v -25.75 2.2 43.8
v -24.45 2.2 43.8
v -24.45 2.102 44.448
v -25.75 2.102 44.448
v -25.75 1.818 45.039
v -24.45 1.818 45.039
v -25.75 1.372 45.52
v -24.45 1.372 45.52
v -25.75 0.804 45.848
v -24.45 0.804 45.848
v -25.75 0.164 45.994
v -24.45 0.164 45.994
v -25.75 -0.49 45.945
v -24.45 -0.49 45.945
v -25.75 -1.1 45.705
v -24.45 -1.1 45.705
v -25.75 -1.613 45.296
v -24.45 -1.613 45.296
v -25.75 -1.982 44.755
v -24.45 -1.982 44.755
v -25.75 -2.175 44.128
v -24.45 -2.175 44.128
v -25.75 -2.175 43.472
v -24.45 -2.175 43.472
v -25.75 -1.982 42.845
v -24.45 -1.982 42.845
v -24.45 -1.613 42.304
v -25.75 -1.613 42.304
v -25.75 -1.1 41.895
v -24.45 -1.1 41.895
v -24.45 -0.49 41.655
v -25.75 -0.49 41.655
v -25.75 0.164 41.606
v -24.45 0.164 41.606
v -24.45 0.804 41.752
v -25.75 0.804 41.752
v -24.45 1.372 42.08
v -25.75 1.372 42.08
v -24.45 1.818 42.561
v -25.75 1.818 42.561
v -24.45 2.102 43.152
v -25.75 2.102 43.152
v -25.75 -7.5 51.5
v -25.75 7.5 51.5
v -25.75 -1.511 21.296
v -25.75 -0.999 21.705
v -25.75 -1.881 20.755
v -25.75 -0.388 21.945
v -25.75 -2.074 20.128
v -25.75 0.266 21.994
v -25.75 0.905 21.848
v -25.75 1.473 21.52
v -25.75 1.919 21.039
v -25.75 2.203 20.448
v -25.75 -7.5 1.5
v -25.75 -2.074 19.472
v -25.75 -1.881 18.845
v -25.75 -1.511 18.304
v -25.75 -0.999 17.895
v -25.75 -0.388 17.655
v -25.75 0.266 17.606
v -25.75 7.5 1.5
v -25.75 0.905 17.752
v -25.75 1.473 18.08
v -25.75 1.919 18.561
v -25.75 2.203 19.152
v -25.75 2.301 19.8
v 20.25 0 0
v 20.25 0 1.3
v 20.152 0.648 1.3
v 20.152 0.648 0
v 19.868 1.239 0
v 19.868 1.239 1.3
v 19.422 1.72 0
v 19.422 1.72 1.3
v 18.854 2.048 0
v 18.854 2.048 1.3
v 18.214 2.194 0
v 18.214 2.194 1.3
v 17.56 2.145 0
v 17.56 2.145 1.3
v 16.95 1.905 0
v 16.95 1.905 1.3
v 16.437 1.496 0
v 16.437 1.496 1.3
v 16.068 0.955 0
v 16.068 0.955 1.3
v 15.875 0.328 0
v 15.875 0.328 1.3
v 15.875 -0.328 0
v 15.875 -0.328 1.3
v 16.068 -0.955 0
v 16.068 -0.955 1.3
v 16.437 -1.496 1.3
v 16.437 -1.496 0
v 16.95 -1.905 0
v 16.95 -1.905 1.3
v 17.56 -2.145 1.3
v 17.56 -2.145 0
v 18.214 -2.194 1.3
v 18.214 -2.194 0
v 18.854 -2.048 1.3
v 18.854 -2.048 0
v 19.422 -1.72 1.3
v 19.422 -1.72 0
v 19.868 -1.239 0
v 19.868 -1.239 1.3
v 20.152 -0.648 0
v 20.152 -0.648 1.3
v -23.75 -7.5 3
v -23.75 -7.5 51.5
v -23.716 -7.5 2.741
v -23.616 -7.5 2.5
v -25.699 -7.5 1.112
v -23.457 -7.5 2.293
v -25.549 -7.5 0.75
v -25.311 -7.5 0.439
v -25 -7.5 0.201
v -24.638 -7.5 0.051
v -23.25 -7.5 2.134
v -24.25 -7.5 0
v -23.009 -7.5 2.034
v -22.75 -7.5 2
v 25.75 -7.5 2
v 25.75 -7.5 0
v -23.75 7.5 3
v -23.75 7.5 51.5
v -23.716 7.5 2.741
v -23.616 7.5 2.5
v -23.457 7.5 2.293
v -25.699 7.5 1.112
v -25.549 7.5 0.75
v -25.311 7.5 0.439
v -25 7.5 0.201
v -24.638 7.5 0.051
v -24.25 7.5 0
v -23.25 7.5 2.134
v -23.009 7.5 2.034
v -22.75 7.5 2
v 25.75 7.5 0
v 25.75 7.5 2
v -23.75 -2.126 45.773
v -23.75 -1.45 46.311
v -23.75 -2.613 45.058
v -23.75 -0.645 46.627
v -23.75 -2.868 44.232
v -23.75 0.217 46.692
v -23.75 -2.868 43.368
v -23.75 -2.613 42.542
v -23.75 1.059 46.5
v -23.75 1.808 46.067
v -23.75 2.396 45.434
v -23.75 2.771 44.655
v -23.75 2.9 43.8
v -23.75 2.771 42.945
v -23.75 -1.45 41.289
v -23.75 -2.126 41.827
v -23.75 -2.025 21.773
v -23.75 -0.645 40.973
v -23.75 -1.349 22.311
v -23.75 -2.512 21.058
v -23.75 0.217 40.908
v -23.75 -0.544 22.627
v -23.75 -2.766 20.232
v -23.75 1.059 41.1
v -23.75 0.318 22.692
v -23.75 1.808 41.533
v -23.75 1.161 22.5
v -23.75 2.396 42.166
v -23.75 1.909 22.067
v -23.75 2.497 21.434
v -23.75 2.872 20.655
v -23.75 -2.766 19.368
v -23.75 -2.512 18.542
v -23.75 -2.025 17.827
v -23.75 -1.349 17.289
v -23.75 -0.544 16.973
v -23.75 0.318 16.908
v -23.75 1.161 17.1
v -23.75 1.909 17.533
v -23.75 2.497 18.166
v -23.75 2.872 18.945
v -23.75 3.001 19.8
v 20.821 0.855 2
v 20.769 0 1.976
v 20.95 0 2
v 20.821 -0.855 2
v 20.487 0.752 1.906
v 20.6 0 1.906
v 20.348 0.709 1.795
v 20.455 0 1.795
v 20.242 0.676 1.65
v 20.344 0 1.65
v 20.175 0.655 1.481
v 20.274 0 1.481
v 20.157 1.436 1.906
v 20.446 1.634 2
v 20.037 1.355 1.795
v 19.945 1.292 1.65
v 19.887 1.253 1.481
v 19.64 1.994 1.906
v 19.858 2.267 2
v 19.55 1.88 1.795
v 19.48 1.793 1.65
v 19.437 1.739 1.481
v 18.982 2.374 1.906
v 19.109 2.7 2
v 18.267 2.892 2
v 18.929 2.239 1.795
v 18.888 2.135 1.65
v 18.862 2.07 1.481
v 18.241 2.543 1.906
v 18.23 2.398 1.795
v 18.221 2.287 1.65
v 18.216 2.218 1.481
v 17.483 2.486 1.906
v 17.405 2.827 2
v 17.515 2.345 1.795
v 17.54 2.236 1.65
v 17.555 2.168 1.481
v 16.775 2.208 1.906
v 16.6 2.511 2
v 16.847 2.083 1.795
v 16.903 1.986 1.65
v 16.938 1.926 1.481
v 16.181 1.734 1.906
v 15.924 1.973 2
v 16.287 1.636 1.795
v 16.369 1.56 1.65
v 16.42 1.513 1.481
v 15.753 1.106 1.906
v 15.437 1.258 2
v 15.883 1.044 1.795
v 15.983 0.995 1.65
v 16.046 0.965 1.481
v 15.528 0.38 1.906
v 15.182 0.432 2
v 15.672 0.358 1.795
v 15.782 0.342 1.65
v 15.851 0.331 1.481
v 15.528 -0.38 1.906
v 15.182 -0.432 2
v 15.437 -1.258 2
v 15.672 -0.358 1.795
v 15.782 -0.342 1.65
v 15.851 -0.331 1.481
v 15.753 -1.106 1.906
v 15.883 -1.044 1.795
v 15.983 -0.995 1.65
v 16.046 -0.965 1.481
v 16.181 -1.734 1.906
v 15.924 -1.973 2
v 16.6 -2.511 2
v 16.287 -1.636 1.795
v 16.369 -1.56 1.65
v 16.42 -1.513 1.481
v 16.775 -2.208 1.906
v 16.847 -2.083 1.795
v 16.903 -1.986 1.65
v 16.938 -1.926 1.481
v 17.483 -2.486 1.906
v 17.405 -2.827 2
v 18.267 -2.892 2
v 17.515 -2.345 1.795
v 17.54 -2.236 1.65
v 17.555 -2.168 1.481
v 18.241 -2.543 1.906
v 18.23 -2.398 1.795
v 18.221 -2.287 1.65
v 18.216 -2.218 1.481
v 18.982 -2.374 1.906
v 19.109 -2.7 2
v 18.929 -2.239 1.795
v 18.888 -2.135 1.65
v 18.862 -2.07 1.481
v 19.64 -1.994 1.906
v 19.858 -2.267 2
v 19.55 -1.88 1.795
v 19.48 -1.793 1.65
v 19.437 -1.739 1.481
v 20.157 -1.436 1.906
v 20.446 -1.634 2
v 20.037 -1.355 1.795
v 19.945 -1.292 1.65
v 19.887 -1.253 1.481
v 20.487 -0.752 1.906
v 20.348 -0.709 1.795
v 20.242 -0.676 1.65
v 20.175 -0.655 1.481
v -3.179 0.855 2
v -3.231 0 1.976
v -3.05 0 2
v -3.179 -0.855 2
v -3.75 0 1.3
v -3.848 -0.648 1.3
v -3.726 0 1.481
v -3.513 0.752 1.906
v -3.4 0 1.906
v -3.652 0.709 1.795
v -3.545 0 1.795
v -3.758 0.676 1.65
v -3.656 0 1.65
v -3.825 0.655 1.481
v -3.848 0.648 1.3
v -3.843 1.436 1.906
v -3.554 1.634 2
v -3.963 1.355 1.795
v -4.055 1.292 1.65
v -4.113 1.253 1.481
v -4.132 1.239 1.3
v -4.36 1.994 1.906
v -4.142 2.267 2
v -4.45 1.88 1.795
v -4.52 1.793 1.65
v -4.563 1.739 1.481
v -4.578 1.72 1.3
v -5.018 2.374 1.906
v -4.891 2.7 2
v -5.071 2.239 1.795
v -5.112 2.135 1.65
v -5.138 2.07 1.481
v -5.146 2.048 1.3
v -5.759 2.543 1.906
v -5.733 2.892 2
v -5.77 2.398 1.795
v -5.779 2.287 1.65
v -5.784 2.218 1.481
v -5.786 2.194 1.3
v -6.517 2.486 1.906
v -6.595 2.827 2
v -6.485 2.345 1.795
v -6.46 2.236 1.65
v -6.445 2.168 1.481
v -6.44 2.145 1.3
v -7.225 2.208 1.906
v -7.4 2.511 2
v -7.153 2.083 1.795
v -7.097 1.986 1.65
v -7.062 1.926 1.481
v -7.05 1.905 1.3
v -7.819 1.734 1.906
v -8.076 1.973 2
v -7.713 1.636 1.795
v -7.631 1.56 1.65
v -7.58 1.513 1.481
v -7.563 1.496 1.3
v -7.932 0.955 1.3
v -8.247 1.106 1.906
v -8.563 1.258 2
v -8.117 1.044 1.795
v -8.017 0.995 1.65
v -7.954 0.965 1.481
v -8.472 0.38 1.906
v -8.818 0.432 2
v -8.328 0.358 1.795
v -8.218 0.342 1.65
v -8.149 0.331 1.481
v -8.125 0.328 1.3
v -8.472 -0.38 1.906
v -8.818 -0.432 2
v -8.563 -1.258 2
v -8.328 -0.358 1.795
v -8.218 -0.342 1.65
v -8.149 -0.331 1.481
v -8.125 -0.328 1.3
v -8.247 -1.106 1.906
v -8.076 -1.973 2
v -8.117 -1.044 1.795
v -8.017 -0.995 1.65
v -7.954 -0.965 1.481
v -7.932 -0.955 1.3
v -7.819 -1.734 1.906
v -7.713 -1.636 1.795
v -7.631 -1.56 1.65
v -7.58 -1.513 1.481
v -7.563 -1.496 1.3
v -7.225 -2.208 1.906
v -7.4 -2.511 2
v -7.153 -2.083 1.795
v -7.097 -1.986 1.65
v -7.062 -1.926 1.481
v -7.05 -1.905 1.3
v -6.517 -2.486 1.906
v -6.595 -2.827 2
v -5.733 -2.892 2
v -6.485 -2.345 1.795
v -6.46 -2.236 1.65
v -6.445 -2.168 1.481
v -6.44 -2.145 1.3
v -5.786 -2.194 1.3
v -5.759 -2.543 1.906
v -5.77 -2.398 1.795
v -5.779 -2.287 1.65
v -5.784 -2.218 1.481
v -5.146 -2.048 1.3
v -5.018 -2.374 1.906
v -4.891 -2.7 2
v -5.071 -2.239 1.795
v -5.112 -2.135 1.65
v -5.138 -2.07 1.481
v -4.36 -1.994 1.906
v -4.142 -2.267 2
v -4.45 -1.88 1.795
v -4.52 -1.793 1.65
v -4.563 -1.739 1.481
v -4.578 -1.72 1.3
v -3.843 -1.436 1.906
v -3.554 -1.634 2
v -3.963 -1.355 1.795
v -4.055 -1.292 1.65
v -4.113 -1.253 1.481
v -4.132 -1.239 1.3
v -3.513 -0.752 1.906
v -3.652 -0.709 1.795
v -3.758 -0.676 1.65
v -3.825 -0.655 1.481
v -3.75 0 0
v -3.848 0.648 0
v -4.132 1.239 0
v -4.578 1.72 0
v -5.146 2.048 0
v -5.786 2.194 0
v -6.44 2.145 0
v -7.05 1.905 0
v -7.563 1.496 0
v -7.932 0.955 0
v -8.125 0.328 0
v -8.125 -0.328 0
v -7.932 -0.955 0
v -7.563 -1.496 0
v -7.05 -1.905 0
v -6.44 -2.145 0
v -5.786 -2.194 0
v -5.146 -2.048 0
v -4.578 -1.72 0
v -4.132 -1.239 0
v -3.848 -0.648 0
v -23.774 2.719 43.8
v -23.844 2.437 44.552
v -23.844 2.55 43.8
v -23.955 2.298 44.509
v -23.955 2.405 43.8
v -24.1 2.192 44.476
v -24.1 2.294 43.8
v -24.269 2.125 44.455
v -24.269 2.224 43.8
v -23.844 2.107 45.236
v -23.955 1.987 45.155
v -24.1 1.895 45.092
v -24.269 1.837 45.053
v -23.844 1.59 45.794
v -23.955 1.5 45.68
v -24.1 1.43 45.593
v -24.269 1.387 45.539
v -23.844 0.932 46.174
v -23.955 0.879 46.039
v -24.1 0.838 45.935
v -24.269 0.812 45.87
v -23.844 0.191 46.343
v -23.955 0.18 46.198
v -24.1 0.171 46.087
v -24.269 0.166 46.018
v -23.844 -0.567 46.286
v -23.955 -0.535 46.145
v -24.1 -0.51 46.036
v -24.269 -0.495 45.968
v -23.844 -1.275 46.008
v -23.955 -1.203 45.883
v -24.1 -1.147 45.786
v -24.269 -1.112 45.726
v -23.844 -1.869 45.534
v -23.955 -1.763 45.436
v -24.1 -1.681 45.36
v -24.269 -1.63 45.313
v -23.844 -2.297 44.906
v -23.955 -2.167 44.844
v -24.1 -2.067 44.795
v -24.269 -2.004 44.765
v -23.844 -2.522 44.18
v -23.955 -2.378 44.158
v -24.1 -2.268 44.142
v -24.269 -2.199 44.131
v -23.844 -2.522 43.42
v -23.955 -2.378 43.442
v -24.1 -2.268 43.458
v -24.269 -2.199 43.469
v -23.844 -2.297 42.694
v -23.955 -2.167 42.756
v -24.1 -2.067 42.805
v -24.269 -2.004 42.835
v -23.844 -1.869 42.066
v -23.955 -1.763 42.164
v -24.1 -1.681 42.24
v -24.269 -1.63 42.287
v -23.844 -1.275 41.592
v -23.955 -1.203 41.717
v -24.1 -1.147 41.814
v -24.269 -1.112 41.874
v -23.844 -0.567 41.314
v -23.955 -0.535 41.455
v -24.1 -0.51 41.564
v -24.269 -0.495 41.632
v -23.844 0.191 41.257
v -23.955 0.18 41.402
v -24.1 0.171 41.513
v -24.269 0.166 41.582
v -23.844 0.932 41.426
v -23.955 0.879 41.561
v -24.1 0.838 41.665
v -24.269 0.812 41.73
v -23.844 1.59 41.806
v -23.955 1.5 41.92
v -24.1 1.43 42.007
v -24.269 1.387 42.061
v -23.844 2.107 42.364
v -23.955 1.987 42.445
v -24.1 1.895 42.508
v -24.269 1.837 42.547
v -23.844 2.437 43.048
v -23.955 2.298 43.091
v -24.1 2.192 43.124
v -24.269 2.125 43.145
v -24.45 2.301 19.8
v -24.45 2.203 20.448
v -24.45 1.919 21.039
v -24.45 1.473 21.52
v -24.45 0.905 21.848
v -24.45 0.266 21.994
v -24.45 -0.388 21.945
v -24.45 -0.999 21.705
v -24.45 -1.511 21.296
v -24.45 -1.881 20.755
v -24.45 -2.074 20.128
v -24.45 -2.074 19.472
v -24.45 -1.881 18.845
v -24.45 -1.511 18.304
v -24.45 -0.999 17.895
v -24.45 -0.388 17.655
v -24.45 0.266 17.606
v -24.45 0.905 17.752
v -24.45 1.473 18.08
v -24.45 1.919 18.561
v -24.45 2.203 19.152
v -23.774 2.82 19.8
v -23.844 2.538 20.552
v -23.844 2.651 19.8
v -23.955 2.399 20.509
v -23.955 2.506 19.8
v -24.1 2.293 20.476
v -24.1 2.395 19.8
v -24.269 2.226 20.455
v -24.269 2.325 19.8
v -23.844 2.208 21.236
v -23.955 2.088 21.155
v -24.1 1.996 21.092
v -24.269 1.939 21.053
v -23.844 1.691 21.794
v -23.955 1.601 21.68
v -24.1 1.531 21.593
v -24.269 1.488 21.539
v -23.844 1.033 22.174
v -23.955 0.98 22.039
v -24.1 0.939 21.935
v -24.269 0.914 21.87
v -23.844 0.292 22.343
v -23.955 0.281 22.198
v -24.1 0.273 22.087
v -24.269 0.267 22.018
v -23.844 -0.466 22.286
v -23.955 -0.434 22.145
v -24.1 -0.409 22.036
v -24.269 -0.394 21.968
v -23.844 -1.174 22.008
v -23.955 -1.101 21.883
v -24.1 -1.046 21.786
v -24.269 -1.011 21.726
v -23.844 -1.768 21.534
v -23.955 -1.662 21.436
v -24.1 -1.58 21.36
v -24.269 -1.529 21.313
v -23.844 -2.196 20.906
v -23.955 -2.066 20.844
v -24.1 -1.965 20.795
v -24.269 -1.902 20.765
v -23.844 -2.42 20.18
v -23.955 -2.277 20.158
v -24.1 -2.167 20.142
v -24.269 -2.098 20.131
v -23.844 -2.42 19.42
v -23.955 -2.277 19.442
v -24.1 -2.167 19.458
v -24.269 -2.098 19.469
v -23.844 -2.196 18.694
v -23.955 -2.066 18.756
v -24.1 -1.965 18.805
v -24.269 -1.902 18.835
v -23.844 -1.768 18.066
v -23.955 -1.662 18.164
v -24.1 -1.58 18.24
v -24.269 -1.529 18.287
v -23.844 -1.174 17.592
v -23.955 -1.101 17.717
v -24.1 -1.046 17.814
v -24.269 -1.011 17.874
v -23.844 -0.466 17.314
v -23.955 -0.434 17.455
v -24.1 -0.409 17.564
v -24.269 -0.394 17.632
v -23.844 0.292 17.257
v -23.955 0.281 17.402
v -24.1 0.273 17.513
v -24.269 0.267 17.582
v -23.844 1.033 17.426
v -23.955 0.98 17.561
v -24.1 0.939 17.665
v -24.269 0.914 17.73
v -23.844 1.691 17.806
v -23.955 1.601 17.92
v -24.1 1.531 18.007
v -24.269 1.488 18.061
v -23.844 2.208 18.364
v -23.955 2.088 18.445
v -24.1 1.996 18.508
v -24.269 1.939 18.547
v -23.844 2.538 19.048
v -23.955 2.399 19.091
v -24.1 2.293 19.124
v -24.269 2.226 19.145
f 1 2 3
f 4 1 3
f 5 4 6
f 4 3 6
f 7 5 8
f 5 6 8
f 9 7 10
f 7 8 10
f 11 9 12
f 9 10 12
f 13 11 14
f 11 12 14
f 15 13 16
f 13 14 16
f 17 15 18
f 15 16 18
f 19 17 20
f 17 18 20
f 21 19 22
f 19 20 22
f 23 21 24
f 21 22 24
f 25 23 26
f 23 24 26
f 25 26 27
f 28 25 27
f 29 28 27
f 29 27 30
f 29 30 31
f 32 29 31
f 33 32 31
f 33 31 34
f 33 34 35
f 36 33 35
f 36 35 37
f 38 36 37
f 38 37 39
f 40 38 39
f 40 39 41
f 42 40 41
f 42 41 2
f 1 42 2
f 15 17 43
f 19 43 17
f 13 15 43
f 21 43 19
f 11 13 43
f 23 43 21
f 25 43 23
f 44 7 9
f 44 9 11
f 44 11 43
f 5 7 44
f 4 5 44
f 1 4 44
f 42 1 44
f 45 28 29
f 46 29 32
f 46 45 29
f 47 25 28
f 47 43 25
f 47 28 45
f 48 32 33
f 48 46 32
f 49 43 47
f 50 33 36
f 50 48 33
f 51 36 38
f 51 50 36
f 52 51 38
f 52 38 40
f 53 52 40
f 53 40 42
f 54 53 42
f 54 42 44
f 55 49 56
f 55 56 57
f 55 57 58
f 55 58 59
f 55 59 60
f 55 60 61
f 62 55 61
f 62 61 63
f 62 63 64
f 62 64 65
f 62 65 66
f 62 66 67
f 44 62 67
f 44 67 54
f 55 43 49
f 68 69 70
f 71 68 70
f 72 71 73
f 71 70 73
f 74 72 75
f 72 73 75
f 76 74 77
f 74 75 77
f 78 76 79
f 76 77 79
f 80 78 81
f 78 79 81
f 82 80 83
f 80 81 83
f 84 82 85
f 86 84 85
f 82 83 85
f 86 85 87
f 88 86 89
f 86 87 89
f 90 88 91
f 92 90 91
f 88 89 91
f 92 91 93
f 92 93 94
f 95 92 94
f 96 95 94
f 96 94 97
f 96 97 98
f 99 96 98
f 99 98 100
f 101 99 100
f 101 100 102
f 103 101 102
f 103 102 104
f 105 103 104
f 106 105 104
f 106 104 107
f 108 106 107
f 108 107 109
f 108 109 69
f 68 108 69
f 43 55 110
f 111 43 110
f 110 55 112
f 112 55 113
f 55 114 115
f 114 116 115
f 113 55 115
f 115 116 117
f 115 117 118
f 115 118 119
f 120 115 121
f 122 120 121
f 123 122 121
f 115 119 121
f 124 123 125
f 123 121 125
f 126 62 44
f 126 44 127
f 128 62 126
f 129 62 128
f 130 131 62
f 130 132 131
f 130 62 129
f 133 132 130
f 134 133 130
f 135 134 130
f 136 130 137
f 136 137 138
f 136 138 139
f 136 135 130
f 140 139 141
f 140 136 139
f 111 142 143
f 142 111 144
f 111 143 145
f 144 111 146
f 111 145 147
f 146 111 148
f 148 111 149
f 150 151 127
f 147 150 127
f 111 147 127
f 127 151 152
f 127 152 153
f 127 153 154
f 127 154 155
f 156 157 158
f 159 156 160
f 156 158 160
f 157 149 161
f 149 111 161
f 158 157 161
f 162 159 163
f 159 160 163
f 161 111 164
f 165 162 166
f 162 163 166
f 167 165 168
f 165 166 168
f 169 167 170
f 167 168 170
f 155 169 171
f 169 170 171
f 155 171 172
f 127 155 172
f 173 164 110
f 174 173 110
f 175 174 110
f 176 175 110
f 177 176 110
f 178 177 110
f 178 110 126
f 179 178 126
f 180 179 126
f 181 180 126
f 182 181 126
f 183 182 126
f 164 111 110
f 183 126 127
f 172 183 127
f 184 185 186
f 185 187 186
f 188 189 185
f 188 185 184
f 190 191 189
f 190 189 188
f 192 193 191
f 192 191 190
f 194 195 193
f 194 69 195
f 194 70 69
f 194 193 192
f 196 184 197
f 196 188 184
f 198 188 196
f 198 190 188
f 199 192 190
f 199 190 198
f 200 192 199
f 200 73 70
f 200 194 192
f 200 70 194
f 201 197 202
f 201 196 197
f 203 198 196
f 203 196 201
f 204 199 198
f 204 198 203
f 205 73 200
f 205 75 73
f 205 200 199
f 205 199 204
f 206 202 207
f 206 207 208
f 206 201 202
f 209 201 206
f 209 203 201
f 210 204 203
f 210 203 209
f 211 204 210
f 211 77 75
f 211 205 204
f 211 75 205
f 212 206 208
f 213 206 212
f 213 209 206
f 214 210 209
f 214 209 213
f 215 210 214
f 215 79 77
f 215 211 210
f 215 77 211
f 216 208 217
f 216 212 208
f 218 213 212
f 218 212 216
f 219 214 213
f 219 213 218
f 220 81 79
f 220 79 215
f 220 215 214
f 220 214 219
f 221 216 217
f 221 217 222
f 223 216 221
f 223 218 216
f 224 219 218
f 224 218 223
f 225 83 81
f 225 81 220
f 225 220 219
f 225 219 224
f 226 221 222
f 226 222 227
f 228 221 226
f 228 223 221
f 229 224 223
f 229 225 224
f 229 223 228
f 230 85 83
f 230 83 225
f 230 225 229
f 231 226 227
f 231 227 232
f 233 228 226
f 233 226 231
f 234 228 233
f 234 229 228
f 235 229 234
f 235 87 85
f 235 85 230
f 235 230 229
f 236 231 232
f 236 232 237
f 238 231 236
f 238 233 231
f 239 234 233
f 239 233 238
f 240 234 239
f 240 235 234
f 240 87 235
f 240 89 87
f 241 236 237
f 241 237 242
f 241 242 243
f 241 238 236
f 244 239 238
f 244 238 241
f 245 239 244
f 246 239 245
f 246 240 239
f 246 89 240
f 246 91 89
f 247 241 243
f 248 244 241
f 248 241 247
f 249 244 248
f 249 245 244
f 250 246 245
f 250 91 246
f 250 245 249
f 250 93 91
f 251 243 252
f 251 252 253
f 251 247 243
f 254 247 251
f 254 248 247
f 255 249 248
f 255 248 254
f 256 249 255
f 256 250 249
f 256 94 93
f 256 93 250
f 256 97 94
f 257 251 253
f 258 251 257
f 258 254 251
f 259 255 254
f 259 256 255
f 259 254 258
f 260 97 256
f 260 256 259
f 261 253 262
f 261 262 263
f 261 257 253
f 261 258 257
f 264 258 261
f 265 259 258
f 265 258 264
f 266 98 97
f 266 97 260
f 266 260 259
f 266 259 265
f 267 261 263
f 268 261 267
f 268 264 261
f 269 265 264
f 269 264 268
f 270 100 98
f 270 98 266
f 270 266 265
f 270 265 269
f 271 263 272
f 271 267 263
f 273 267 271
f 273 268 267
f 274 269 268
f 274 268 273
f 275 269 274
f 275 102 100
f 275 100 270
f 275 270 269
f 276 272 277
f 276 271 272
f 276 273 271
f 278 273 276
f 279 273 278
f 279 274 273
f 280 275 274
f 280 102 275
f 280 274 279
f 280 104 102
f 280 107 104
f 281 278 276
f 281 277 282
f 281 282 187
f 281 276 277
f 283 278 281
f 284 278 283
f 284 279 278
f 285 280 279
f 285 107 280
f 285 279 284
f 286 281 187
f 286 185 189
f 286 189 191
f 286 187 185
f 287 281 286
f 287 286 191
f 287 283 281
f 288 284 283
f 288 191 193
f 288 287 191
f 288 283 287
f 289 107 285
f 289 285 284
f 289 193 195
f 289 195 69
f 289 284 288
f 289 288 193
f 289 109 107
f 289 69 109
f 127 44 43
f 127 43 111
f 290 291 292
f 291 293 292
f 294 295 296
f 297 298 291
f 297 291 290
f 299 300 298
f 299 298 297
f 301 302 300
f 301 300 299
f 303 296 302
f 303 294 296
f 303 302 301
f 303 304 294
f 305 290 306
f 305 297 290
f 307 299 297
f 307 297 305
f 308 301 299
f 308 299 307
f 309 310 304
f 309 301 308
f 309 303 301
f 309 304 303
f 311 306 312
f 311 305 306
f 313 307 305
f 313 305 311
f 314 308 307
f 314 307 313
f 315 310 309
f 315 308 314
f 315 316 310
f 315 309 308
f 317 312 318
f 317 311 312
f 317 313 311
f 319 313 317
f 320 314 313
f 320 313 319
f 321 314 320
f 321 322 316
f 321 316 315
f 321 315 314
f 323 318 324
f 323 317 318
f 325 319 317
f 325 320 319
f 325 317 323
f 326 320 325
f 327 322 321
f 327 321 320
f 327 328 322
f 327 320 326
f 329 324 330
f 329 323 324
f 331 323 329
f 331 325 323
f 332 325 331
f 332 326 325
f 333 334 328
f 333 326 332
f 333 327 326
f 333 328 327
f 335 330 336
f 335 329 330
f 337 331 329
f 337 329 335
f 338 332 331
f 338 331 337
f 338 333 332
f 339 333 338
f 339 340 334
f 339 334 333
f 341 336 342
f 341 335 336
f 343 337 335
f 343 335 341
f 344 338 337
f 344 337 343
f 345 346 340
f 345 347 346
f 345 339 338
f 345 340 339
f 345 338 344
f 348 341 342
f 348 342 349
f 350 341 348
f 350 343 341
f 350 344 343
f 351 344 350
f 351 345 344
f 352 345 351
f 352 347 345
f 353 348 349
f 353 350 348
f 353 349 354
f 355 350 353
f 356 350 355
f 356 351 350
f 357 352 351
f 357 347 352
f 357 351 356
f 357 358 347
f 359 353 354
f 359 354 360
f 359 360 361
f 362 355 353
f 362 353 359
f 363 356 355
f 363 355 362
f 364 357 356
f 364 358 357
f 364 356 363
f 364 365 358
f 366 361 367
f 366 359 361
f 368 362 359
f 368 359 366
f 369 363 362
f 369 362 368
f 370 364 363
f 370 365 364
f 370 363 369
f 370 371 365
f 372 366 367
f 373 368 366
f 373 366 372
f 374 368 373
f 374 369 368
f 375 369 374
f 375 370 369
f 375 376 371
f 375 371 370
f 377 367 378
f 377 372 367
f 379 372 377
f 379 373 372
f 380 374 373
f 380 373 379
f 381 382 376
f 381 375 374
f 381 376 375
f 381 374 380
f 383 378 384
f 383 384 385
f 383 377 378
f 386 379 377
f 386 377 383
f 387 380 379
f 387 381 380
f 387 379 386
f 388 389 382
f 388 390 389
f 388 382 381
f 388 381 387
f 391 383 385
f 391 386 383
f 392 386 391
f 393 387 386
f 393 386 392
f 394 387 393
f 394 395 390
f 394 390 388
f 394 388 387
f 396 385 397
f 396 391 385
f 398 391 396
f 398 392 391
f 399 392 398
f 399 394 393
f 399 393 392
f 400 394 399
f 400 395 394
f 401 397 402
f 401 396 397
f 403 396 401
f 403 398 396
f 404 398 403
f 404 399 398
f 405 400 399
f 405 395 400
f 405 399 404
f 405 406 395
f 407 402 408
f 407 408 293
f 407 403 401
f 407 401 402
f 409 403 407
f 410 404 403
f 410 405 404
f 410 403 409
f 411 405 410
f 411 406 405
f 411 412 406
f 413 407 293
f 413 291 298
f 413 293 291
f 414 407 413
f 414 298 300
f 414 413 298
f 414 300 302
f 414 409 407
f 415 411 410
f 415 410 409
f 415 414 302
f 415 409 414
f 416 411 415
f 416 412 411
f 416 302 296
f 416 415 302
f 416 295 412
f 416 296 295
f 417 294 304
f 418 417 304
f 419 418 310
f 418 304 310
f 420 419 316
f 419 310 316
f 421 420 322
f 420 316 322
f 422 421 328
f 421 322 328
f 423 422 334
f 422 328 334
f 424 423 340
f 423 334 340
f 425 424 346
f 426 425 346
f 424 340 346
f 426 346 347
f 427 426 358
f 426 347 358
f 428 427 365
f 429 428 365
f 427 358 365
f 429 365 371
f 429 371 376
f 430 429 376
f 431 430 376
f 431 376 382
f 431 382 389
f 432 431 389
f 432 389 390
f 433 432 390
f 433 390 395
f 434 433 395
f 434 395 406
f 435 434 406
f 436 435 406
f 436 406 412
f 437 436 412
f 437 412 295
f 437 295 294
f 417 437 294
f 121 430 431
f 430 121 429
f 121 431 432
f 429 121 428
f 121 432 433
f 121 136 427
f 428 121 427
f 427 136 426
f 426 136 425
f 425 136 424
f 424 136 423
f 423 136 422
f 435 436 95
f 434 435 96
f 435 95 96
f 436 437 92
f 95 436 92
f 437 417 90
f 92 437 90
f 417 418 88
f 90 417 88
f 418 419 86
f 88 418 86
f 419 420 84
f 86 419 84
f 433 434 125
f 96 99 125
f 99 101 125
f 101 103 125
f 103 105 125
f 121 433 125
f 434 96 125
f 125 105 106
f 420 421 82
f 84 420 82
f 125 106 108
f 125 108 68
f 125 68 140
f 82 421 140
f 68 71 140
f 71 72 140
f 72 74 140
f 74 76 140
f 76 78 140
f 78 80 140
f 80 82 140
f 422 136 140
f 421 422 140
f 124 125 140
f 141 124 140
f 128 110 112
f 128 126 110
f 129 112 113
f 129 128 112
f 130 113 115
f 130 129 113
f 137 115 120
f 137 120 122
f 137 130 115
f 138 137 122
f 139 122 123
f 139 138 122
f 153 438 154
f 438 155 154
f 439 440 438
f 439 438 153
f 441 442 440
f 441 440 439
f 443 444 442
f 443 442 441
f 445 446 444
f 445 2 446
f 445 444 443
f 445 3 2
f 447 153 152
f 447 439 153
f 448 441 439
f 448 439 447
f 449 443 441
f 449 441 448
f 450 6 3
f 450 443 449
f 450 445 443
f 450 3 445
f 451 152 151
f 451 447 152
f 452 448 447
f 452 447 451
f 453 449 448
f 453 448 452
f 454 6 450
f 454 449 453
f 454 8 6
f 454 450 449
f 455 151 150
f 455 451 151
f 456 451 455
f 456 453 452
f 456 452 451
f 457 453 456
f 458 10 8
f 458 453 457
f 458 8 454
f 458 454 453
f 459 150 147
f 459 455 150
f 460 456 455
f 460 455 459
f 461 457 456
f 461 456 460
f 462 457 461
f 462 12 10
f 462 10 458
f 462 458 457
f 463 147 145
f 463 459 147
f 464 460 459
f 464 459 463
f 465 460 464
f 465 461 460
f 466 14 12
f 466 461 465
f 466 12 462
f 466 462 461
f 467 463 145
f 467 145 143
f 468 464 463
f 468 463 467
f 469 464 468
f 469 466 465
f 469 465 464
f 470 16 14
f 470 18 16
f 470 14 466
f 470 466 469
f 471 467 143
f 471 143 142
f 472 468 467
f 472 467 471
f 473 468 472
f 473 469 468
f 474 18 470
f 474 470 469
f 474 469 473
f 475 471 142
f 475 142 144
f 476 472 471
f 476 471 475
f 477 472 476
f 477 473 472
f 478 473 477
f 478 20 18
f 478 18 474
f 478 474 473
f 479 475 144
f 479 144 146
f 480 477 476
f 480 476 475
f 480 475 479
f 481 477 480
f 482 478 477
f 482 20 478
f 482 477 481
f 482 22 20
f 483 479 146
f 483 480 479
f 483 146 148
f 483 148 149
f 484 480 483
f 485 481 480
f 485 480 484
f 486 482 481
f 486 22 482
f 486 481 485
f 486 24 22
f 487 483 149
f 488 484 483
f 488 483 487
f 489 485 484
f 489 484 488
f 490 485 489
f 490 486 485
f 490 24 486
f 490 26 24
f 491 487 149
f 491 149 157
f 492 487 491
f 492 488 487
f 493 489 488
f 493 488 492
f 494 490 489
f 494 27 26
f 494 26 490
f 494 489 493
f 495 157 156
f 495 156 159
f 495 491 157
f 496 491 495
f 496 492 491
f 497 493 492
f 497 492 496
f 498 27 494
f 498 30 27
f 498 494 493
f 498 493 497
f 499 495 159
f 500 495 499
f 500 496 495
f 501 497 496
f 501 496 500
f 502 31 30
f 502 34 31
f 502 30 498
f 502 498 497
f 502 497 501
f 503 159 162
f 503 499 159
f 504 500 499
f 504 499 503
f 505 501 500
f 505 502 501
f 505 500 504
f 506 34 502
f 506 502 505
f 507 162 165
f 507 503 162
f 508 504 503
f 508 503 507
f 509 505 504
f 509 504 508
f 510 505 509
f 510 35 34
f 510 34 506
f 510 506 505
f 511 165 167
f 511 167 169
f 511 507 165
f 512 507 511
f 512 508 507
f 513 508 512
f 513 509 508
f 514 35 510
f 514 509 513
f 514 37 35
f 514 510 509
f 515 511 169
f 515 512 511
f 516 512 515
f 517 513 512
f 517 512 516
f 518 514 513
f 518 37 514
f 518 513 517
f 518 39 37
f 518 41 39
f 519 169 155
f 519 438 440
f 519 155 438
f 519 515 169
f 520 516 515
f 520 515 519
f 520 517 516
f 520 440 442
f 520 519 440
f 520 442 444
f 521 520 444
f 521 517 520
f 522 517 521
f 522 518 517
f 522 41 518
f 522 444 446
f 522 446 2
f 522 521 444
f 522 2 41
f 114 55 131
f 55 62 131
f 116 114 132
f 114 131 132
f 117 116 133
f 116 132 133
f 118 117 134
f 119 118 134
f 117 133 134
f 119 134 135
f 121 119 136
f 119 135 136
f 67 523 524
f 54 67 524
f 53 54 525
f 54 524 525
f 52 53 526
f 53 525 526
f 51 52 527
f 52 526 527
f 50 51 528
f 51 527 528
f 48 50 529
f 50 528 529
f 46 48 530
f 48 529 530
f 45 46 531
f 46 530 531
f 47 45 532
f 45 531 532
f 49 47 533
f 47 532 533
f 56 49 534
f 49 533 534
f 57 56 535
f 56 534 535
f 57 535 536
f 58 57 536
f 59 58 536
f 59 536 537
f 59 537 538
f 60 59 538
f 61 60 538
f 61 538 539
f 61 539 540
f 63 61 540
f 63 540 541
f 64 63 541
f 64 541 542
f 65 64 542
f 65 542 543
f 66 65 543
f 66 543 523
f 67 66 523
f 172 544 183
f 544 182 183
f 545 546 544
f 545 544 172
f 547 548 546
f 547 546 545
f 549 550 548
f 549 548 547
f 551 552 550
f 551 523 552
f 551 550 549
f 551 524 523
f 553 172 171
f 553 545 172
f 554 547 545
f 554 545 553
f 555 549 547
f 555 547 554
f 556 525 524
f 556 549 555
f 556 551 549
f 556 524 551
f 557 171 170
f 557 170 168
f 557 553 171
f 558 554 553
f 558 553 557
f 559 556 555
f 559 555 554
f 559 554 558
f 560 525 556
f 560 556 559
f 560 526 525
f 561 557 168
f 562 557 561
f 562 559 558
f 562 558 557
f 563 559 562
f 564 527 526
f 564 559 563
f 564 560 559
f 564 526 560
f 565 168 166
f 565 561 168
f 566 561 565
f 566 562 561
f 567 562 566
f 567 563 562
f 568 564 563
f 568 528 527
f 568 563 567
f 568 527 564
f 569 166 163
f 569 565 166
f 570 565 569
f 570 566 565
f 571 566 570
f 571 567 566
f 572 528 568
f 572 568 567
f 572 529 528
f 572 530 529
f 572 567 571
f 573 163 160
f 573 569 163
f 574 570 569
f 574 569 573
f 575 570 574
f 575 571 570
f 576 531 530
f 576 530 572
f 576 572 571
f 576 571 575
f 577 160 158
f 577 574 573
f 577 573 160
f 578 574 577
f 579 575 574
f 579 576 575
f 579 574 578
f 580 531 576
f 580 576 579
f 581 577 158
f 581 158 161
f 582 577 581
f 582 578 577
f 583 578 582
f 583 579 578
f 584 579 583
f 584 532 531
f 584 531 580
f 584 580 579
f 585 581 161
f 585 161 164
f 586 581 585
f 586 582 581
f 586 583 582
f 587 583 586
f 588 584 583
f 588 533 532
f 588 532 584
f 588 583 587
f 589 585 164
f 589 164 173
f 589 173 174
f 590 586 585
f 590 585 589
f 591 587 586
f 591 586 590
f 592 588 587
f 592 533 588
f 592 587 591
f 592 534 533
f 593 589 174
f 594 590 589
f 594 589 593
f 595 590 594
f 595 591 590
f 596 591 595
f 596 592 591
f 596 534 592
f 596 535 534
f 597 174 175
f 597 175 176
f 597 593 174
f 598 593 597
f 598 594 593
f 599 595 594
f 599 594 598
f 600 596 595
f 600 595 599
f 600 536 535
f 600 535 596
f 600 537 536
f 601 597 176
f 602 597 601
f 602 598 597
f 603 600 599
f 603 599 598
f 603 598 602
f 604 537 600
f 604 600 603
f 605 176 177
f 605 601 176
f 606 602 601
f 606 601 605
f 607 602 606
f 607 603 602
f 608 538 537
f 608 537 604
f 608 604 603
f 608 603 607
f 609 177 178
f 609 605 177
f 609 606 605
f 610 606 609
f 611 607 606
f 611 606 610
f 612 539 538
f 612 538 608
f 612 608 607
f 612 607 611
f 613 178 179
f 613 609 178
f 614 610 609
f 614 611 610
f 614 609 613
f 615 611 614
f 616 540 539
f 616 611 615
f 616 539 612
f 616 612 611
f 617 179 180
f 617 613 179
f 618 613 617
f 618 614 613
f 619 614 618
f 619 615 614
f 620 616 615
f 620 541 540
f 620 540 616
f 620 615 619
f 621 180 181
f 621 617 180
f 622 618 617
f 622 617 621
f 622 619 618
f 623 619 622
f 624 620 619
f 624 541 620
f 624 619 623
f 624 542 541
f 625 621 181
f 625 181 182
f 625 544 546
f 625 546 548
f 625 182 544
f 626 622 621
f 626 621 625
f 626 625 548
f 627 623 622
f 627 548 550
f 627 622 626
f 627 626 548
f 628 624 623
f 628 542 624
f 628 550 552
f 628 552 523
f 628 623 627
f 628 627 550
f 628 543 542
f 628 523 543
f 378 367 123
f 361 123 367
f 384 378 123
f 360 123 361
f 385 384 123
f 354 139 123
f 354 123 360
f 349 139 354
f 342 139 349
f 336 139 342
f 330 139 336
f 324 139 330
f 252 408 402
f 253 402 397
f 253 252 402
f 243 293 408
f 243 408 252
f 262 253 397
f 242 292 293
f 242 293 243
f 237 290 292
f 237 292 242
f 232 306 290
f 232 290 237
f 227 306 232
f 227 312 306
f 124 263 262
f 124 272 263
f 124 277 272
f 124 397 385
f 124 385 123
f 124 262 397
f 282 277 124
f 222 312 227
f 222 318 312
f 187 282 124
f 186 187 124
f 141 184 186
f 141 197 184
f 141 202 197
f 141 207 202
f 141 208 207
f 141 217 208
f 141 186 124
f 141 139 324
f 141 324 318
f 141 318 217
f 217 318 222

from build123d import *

# Parameters (mm, degrees)
SKETCH_W        = 51.5
SKETCH_H        = 15
PAD_DEPTH       = 2
SKETCH001_W     = 2
SKETCH001_H     = 15
PAD001_DEPTH    = 49.5
FILLET_R        = 1.5
FILLET001_R     = 1
SKETCH002_R     = 2.2
POCKET_DEPTH    = 2.001
FILLET002_R     = 0.7
SKETCH003_R     = 2.2
POCKET001_DEPTH = 2.001
FILLET003_R     = 0.7


with BuildPart() as part:
    # Sketch → Pad (new body)
    with BuildSketch(Plane.XY):
        Rectangle(SKETCH_W, SKETCH_H)
    extrude(amount=PAD_DEPTH)

    # Sketch001 (on Face6 of Pad) → Pad001 (join)
    with BuildSketch(Plane.XY.offset(2)):
        with Locations((-24.75, 0)):
            Rectangle(SKETCH001_W, SKETCH001_H)
    extrude(amount=PAD001_DEPTH)

    # Fillet
    fillet_edges = [part.edges().sort_by_distance(p)[0] for p in [
        (-25.75, 0, 0),
    ]]
    fillet(fillet_edges, radius=FILLET_R)

    # Fillet001
    fillet001_edges = [part.edges().sort_by_distance(p)[0] for p in [
        (-23.75, 0, 2),
    ]]
    fillet(fillet001_edges, radius=FILLET001_R)

    # Sketch002 (on Face2 of Fillet001) → Pocket (cut, through all)
    with BuildSketch(Plane.XY.offset(2)):
        with Locations((18.05, 0)):
            Circle(SKETCH002_R)
        with Locations((-5.95, 0)):
            Circle(SKETCH002_R)
    extrude(amount=-POCKET_DEPTH, mode=Mode.SUBTRACT)

    # Fillet002
    fillet002_edges = [part.edges().sort_by_distance(p)[0] for p in [
        (15.85, 0, 2),
        (-8.15, 0, 2),
    ]]
    fillet(fillet002_edges, radius=FILLET002_R)

    # Sketch003 (on Face14 of Fillet002) → Pocket001 (cut, through all)
    with BuildSketch(Plane.YZ.offset(-23.75)):
        with Locations((0, 43.8)):
            Circle(SKETCH003_R)
        with Locations((0.10123, 19.8)):
            Circle(SKETCH003_R)
    extrude(amount=-POCKET001_DEPTH, mode=Mode.SUBTRACT)

    # Fillet003
    fillet003_edges = [part.edges().sort_by_distance(p)[0] for p in [
        (-23.75, -2.2, 43.8),
        (-23.75, -2.09877, 19.8),
    ]]
    fillet(fillet003_edges, radius=FILLET003_R)


solid = part.part
